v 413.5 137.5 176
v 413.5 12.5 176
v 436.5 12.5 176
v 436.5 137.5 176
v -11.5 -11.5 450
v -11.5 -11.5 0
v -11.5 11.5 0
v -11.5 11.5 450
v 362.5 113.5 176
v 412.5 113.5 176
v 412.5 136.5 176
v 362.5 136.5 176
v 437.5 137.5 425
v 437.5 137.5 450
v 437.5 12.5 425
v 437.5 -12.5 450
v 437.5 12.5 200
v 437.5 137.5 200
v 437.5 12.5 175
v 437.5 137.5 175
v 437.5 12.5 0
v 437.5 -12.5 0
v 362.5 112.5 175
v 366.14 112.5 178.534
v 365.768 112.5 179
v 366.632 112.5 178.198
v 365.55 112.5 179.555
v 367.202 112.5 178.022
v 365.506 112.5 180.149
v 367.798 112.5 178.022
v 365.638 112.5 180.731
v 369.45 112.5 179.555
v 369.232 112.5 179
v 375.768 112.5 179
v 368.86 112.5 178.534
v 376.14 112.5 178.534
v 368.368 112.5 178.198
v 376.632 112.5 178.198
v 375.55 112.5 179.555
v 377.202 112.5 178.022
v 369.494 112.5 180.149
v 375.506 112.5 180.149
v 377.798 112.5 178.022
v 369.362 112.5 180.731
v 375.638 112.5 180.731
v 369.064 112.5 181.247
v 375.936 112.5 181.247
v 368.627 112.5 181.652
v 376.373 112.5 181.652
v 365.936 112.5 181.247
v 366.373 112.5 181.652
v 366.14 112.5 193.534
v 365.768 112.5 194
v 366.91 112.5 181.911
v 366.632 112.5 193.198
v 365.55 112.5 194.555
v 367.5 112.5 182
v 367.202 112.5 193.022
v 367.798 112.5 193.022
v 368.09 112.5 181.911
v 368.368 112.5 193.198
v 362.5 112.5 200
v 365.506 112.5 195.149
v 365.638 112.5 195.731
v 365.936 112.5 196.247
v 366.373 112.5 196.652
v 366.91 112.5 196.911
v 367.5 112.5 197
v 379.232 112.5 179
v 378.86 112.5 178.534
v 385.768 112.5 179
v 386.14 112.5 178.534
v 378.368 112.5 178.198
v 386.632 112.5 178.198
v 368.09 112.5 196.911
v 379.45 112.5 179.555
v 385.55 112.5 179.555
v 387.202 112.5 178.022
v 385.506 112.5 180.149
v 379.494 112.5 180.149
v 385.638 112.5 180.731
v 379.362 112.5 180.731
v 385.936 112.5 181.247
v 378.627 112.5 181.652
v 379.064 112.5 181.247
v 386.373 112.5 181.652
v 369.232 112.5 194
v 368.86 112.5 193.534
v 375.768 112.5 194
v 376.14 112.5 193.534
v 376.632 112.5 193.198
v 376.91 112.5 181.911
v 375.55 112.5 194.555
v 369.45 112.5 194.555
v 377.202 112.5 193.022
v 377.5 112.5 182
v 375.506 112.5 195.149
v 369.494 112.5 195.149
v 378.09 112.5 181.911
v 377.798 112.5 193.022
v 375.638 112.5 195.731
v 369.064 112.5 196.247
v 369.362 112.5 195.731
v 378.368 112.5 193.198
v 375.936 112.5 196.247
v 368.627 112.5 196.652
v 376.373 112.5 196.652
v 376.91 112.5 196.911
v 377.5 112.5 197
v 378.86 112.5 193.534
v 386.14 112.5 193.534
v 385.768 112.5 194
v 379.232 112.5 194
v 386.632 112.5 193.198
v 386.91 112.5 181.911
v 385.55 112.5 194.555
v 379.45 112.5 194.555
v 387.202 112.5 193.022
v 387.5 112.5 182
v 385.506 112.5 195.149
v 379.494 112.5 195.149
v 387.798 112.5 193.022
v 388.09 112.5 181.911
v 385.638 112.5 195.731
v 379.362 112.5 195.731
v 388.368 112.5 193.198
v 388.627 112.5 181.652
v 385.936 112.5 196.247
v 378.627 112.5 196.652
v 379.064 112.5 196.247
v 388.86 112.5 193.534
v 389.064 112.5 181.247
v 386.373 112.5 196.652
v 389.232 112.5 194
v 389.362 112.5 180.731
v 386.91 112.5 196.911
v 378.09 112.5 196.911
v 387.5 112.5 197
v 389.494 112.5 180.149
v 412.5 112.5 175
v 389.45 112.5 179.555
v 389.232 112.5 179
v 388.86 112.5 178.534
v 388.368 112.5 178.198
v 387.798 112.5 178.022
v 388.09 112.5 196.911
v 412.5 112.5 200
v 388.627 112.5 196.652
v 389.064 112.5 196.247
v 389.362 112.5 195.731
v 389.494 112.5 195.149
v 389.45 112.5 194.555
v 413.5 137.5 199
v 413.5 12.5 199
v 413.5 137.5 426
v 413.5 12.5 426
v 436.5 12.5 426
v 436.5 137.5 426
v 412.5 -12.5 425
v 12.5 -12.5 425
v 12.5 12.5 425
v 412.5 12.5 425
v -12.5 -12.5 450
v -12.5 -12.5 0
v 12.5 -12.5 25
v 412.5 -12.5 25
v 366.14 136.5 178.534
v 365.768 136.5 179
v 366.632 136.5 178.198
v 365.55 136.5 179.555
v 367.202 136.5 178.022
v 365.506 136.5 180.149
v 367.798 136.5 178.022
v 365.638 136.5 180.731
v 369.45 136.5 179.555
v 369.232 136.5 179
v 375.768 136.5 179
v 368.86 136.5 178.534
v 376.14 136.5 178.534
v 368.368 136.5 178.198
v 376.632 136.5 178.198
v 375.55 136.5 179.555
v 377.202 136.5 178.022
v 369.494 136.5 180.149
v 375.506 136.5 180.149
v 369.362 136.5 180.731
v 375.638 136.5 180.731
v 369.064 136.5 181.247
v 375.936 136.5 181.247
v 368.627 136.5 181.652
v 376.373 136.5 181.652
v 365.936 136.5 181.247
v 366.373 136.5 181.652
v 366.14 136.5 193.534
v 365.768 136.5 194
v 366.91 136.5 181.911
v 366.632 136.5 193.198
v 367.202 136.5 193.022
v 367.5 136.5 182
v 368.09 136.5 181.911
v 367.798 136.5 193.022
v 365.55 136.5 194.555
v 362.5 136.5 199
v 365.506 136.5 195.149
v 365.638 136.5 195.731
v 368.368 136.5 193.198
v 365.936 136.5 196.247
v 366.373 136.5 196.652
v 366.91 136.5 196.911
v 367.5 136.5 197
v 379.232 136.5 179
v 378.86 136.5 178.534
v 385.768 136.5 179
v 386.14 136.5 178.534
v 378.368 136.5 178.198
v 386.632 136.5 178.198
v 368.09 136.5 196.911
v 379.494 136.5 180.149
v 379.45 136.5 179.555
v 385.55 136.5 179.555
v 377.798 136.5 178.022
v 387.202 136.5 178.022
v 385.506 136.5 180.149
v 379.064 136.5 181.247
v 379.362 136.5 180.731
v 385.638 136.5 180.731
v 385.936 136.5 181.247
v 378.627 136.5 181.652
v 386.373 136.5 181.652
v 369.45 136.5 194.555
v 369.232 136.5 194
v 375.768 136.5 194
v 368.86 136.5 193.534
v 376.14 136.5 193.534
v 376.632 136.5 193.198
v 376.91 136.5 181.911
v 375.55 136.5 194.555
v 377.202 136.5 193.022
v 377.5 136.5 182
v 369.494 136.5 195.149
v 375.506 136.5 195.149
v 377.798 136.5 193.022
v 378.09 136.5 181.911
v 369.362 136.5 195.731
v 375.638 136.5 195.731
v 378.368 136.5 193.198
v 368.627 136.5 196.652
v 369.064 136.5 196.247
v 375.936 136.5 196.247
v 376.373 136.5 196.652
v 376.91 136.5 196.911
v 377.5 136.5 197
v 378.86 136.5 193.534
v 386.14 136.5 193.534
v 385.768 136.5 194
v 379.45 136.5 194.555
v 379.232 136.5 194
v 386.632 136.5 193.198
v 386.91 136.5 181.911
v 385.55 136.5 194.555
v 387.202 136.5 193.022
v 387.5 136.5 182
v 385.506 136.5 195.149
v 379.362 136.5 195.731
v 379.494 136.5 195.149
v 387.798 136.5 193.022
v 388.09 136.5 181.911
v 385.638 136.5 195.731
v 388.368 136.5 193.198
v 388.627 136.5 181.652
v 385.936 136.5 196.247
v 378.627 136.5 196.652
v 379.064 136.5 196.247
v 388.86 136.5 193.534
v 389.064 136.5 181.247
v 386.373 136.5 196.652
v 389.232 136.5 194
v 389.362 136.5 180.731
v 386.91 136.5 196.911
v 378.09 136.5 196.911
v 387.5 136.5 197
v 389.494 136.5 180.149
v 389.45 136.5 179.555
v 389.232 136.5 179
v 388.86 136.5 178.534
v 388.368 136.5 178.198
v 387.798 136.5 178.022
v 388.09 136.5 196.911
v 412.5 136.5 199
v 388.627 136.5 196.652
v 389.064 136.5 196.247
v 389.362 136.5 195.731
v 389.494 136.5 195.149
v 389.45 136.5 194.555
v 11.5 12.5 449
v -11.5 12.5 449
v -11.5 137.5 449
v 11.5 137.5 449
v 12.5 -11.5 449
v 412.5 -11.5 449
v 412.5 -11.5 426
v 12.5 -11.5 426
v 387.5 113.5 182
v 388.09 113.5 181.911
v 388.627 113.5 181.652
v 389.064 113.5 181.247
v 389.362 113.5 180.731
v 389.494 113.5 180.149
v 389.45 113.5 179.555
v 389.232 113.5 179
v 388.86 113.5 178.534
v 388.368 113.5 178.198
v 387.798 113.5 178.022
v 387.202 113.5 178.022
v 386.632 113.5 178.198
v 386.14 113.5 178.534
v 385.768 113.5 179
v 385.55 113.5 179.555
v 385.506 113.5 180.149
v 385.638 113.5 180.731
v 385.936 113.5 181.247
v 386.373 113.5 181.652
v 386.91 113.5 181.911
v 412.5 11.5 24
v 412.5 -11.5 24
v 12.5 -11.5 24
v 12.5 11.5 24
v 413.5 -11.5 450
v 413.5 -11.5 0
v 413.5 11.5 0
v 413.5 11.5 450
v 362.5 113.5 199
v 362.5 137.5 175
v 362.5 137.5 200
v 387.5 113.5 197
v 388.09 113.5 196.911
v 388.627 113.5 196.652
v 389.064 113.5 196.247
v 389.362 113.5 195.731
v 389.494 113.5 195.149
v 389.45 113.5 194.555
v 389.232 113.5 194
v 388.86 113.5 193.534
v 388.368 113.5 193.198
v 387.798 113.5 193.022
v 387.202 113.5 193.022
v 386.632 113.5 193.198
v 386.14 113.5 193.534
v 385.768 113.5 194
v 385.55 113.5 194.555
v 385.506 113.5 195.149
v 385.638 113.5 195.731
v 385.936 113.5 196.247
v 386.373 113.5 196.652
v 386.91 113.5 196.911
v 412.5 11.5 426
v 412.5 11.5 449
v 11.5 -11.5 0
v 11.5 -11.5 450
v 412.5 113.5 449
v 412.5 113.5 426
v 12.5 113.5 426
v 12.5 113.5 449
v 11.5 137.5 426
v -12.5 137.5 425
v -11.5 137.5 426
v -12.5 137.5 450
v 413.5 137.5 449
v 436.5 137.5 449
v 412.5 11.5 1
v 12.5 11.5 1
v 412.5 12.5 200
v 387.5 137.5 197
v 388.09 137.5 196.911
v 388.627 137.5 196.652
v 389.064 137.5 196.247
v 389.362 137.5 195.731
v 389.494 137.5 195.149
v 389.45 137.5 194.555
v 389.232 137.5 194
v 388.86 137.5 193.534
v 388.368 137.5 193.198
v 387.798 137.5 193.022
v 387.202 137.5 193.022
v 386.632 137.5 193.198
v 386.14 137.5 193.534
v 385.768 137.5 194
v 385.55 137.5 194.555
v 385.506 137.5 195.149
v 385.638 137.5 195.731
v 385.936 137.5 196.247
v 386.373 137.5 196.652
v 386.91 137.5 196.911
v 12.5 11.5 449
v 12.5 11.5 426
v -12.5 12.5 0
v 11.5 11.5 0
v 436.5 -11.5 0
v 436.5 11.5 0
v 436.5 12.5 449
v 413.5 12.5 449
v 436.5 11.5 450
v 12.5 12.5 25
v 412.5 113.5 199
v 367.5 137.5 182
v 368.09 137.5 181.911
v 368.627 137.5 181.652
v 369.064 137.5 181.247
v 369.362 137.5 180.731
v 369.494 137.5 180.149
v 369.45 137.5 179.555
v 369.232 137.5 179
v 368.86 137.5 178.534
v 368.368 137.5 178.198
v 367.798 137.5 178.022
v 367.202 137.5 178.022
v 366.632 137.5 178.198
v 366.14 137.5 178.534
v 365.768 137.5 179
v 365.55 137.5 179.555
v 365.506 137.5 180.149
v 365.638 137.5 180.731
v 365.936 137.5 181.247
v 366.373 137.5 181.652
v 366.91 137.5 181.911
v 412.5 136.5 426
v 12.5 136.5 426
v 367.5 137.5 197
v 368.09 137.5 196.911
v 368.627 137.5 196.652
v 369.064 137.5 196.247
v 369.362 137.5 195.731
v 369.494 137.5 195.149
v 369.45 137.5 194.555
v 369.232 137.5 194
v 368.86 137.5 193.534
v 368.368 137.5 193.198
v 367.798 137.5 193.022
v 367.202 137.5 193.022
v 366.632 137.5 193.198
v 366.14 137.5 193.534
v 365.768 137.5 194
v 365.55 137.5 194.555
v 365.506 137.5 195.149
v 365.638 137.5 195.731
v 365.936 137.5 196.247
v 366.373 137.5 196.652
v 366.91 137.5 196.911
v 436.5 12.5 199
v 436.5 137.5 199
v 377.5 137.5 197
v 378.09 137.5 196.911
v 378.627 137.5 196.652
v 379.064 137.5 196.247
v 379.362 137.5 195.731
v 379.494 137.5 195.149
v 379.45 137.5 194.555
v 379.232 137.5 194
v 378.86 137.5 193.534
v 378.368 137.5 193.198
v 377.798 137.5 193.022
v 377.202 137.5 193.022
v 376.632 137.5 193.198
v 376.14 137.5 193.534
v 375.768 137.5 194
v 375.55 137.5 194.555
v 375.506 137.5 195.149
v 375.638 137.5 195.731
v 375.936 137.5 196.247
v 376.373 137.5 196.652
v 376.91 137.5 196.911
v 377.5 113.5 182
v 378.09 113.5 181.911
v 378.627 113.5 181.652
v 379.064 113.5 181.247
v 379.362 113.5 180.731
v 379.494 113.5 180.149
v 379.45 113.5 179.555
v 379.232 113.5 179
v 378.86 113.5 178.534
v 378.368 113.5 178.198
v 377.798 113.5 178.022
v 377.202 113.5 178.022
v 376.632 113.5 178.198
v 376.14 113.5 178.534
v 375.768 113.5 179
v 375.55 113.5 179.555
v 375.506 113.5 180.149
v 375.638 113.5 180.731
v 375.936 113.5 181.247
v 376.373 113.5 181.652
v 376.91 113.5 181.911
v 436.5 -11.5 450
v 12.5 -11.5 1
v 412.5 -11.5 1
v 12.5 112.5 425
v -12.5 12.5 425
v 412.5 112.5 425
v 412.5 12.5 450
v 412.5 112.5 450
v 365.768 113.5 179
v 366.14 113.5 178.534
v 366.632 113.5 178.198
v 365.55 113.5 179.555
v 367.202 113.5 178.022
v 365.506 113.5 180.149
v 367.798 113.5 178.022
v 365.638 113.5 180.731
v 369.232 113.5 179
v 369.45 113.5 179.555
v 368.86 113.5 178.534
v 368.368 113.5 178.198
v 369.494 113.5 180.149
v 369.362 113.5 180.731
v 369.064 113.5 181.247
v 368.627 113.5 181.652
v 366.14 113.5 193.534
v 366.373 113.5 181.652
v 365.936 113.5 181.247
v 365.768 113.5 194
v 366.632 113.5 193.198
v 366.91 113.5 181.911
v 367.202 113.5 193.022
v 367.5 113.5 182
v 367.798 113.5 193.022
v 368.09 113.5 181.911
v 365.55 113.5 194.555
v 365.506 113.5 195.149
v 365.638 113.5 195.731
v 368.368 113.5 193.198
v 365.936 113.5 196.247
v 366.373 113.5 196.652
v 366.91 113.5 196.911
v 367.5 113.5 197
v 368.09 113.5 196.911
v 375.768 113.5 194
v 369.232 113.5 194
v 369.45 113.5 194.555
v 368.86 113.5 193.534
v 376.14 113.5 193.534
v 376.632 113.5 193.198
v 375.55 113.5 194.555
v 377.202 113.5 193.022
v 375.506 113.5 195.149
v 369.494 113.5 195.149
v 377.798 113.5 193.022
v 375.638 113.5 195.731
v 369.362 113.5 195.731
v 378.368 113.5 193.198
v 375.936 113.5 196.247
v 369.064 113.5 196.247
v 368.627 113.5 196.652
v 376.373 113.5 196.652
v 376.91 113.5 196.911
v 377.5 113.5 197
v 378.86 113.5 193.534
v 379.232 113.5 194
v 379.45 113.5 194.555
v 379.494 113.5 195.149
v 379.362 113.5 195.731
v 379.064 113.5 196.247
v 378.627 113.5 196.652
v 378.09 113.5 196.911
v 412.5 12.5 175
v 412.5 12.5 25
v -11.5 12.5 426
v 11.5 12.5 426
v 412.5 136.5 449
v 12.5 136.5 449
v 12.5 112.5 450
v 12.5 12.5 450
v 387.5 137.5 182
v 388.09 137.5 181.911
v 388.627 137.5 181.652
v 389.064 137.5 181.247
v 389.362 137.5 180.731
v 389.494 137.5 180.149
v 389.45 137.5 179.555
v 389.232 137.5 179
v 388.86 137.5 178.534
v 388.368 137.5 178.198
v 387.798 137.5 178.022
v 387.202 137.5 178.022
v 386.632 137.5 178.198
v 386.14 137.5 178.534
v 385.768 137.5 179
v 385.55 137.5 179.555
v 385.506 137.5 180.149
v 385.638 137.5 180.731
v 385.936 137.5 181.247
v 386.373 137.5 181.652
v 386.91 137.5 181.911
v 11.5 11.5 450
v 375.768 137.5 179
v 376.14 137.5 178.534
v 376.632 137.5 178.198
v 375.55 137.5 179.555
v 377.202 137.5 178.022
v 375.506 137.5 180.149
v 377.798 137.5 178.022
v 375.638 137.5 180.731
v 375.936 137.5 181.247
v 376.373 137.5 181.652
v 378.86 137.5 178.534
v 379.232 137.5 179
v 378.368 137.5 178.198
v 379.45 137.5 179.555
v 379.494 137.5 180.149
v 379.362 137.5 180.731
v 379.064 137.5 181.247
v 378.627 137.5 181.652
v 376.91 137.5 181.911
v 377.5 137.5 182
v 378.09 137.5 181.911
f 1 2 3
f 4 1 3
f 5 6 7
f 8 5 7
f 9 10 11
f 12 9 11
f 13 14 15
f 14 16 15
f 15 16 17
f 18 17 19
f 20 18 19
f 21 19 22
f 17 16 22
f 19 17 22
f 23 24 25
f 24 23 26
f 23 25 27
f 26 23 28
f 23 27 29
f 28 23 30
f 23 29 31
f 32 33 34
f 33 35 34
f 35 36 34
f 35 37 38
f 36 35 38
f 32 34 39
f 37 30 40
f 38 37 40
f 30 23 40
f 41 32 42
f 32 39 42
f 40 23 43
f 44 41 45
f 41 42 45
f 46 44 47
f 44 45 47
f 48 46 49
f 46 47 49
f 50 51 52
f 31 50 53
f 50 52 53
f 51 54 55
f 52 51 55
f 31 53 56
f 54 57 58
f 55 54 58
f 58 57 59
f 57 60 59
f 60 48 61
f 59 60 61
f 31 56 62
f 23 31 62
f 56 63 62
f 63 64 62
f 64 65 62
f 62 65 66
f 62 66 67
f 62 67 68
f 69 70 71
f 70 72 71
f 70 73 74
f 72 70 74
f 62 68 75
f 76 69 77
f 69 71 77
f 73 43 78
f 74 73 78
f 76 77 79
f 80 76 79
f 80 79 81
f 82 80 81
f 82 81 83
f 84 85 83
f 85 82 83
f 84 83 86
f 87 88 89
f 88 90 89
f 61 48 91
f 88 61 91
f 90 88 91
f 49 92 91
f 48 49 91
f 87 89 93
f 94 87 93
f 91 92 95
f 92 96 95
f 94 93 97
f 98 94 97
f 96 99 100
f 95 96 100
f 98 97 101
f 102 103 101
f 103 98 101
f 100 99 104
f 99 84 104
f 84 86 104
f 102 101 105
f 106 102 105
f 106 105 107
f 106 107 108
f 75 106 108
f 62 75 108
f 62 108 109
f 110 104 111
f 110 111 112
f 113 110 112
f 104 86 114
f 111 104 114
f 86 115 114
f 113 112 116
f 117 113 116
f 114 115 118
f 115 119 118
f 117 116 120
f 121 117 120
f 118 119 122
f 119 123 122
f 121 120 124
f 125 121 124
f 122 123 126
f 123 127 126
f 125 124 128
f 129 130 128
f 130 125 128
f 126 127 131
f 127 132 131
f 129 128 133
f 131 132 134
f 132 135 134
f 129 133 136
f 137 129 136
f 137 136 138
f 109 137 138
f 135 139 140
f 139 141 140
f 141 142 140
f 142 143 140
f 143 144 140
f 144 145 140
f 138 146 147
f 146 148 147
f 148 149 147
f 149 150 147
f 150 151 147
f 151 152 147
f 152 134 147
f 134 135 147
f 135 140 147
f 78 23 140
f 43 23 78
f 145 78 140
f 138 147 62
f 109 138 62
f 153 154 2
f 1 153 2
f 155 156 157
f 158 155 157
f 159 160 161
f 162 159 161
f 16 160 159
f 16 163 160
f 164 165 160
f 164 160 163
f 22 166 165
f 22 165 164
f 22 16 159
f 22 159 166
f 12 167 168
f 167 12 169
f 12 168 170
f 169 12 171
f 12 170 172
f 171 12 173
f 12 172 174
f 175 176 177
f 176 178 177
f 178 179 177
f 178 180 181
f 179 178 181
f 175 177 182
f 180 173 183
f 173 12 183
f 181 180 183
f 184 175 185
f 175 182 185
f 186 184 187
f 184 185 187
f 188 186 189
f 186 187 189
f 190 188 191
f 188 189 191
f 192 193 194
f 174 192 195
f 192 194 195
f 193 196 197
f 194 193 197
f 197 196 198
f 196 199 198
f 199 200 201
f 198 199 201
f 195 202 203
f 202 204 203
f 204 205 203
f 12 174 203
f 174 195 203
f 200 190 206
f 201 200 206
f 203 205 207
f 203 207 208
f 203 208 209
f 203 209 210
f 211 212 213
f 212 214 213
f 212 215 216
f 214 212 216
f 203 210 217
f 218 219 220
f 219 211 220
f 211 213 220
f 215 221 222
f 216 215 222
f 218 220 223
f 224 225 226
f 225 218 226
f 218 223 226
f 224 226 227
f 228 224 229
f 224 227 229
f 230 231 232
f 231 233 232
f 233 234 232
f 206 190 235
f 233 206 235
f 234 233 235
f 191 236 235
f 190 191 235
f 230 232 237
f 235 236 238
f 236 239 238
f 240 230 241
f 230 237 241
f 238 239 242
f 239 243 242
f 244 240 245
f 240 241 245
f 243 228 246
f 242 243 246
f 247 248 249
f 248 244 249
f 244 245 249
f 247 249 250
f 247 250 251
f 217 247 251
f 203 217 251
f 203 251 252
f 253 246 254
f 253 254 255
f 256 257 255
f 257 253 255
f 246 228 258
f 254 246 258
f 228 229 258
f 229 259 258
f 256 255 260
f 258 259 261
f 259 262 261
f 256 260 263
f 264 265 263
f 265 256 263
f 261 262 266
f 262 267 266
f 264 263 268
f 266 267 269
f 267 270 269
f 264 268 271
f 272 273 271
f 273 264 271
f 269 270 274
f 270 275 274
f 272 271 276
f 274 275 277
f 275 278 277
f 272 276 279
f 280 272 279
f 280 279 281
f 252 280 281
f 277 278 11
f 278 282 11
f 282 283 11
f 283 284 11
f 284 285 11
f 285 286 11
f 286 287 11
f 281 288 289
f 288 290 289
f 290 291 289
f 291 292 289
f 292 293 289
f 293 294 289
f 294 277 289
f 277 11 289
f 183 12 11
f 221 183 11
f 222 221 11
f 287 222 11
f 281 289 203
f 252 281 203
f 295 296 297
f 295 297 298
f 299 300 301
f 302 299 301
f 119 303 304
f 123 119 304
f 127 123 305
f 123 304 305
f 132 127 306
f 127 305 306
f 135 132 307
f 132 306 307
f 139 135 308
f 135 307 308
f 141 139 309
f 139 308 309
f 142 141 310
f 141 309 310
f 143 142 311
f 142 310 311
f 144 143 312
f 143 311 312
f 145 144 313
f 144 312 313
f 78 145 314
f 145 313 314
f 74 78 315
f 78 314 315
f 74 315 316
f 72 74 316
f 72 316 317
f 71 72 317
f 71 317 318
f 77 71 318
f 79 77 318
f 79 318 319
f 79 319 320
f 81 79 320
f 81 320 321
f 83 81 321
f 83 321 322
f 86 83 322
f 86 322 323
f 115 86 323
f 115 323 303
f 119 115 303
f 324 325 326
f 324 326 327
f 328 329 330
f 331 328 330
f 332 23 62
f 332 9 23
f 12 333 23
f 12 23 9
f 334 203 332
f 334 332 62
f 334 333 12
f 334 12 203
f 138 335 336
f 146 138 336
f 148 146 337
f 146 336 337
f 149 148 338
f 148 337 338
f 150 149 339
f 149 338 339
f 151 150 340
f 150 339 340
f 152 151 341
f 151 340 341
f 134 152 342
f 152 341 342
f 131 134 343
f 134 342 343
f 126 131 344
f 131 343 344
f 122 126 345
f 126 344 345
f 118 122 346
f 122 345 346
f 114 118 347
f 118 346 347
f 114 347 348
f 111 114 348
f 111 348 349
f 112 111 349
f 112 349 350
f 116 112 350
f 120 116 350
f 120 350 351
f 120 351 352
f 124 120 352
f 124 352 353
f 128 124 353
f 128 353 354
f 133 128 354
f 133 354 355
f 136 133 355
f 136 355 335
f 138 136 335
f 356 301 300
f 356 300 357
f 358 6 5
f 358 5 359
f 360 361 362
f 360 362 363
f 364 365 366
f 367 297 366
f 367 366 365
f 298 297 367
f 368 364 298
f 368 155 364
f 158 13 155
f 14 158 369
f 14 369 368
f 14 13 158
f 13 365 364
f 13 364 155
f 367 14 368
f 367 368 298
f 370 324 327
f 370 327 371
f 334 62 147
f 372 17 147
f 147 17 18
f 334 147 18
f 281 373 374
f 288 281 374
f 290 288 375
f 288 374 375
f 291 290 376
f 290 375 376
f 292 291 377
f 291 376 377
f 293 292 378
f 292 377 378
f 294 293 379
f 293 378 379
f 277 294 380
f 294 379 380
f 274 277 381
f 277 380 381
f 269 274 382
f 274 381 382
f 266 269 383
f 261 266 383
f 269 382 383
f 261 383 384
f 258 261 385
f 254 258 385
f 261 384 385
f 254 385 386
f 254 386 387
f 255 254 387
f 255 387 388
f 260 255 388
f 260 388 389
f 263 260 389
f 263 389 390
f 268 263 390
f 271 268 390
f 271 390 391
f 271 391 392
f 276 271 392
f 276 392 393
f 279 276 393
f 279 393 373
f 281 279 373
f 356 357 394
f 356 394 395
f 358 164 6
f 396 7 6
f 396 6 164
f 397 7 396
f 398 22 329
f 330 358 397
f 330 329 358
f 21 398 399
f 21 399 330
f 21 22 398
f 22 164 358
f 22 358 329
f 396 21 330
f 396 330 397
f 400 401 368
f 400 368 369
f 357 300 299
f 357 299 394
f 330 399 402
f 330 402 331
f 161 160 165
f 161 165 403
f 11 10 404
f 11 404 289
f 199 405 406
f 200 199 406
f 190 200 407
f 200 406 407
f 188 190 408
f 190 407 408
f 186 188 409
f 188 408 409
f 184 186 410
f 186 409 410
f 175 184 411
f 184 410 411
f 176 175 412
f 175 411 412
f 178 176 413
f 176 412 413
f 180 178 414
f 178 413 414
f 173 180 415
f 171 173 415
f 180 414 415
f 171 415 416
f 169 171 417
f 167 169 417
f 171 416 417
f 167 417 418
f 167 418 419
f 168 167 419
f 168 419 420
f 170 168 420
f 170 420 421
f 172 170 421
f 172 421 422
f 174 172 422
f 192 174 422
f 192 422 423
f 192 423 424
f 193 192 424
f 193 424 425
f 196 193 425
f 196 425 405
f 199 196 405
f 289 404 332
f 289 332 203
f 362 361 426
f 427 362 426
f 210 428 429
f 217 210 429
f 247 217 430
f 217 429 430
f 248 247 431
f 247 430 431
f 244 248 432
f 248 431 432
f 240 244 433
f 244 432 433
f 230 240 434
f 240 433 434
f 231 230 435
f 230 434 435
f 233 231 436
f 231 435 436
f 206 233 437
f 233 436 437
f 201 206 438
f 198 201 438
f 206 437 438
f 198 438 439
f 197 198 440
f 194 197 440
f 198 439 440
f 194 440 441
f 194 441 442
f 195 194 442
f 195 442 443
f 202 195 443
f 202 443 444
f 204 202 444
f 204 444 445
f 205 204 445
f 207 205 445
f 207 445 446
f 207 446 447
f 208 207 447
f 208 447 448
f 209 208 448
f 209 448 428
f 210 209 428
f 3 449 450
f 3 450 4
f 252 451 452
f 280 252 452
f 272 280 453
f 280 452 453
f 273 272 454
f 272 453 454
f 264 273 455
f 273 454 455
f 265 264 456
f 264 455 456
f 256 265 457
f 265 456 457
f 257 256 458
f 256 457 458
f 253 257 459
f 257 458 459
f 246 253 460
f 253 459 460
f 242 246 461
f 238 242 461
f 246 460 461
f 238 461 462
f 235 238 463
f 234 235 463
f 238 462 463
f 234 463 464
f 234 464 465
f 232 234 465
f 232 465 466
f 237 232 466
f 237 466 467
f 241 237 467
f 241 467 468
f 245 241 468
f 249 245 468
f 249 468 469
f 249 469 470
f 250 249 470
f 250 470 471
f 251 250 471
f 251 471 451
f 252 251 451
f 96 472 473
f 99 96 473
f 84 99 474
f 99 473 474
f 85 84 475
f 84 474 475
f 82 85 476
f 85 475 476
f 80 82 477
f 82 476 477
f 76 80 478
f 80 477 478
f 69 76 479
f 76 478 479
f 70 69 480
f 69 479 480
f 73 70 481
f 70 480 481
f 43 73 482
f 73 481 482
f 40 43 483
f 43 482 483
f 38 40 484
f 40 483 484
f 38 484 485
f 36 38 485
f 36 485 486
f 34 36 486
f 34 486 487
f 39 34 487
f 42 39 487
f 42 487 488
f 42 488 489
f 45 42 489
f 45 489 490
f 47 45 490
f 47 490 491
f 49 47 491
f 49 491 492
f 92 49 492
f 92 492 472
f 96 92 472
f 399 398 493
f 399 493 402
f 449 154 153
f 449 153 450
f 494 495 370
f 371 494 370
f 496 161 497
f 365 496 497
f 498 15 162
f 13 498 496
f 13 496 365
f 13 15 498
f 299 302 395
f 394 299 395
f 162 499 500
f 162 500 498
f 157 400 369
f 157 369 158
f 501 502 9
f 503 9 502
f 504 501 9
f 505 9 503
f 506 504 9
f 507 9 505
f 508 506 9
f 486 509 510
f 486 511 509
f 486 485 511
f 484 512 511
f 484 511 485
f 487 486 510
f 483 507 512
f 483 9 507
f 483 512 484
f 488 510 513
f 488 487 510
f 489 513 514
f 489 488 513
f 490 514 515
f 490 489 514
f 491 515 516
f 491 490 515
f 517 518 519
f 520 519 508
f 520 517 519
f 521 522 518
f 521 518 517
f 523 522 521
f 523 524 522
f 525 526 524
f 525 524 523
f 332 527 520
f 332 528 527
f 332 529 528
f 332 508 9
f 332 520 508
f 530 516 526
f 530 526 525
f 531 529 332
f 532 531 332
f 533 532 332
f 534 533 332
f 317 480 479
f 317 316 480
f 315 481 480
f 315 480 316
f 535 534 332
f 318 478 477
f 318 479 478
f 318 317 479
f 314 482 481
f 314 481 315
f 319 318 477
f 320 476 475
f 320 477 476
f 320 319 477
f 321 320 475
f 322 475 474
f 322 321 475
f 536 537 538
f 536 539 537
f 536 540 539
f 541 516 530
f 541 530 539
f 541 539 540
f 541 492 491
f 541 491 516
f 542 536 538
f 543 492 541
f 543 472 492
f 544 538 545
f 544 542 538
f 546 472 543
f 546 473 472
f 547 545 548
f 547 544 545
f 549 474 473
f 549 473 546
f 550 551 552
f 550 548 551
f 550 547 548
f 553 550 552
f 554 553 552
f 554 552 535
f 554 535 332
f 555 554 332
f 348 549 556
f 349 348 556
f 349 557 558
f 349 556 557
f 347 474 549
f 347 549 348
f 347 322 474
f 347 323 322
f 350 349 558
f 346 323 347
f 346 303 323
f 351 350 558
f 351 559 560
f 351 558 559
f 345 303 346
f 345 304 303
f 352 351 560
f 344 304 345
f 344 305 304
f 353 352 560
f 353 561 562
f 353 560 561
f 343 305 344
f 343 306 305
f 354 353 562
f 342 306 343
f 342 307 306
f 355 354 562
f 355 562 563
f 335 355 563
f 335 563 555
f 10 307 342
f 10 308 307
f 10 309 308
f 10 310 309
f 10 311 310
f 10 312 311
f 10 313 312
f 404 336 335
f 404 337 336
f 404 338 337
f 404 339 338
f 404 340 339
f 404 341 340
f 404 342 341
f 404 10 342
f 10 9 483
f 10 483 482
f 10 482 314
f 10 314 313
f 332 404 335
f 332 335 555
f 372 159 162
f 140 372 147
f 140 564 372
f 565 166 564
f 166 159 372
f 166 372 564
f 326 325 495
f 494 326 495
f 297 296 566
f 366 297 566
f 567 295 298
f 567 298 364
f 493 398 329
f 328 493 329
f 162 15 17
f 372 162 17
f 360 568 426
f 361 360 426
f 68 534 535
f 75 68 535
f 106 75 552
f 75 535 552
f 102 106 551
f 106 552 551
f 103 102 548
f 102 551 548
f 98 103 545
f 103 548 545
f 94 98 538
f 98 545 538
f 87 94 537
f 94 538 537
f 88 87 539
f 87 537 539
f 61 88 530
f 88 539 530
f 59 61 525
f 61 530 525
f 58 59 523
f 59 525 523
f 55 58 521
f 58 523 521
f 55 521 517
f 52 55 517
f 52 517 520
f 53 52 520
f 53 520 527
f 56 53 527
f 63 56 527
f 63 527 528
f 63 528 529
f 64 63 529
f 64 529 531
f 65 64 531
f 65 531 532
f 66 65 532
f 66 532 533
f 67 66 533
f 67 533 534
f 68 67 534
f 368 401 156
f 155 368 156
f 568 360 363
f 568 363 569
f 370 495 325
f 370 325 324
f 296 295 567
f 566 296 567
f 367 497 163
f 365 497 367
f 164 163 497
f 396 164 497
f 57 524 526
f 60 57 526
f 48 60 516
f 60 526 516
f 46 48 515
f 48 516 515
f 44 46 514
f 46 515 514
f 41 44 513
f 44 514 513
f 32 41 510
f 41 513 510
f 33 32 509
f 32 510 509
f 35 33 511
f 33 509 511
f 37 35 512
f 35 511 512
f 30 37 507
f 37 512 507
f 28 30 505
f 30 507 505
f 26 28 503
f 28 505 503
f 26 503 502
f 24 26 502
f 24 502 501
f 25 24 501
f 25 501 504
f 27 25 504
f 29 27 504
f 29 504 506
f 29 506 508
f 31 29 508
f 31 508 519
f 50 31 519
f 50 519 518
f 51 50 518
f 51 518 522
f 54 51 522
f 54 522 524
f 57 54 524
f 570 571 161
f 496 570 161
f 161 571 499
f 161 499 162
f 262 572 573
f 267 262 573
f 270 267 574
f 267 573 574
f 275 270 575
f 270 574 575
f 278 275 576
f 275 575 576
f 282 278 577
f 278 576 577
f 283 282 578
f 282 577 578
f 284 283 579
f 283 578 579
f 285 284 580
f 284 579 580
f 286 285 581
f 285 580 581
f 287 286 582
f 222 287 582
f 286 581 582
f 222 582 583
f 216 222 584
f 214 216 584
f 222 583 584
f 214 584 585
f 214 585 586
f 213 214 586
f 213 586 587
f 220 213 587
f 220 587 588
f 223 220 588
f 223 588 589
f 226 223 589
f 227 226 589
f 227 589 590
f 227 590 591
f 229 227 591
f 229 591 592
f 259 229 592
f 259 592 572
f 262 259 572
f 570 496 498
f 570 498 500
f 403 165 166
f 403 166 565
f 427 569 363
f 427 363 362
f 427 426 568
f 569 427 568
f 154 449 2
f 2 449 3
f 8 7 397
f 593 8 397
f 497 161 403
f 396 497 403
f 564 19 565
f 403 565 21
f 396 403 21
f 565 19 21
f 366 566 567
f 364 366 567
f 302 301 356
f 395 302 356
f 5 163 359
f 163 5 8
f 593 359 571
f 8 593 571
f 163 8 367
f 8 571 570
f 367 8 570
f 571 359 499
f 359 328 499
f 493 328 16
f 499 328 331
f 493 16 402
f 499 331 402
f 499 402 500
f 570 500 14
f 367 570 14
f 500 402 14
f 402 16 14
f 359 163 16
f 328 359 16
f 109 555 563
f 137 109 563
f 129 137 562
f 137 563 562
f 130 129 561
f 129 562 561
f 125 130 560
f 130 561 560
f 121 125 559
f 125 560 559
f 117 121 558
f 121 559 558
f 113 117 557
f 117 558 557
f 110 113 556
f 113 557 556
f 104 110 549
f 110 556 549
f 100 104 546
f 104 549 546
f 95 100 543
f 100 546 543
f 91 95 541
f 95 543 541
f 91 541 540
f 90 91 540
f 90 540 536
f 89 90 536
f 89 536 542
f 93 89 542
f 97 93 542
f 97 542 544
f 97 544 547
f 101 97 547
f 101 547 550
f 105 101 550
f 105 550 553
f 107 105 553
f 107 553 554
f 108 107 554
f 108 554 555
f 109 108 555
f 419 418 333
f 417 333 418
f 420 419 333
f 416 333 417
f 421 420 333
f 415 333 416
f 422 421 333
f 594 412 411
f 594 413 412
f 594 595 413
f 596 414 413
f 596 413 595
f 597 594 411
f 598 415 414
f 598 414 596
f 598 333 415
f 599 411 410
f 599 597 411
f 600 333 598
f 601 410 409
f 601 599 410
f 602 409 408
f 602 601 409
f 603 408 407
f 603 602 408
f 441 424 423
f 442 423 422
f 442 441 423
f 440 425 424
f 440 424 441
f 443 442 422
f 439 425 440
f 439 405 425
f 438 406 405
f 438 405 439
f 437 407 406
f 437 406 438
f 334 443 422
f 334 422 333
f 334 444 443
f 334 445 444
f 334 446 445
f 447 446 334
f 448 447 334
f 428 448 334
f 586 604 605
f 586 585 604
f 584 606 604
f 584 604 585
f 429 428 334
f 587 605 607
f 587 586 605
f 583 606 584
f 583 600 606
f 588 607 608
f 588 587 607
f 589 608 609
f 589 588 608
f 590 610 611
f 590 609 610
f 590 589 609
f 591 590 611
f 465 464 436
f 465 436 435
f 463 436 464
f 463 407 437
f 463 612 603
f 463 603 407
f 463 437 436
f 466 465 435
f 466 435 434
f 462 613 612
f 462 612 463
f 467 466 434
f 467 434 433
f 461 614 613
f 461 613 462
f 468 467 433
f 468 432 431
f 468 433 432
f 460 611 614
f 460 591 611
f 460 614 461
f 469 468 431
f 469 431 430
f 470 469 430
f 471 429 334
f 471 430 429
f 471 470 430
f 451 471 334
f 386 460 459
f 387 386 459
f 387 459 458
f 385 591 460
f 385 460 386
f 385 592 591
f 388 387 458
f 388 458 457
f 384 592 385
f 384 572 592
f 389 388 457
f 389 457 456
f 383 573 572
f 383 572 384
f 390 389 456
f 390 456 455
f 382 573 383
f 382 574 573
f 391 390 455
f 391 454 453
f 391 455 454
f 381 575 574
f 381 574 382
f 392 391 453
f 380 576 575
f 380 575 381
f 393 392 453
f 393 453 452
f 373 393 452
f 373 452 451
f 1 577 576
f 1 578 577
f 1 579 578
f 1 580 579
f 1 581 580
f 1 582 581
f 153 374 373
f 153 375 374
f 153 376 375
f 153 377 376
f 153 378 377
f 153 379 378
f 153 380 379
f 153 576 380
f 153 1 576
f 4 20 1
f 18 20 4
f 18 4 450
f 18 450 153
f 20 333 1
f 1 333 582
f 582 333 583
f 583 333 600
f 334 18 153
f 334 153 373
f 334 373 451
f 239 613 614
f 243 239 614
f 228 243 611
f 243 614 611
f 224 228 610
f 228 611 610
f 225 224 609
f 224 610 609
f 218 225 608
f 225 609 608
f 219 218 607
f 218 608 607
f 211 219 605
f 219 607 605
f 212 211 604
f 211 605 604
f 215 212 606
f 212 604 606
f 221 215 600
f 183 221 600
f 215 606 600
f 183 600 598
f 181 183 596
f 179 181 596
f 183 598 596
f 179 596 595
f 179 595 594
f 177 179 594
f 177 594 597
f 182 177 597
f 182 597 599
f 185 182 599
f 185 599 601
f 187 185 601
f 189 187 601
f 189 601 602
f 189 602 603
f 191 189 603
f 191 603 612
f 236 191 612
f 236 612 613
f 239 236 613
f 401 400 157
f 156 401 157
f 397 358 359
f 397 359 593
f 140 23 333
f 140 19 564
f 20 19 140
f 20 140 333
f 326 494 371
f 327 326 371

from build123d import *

# Parameters (mm, degrees)
SKETCH1_W           = 25
SKETCH1_H           = 25
SKETCH1_W_2         = 23
SKETCH1_H_2         = 23
BOSS_EXTRUDE1_DEPTH = 450
SKETCH2_W           = 25
SKETCH2_H           = 25
SKETCH2_W_2         = 23
SKETCH2_H_2         = 23
BOSS_EXTRUDE2_DEPTH = 200
SKETCH3_W           = 25
SKETCH3_H           = 25
SKETCH3_W_2         = 23
SKETCH3_H_2         = 23
BOSS_EXTRUDE3_DEPTH = 200
SKETCH4_W           = 25
SKETCH4_H           = 25
SKETCH4_W_2         = 23
SKETCH4_H_2         = 23
BOSS_EXTRUDE4_DEPTH = 125
SKETCH5_W           = 25
SKETCH5_H           = 25
SKETCH5_W_2         = 23
SKETCH5_H_2         = 23
BOSS_EXTRUDE5_DEPTH = 50
SKETCH6_R           = 2
CUT_EXTRUDE1_DEPTH  = 25
SKETCH7_W           = 25
SKETCH7_H           = 25
SKETCH7_W_2         = 23
SKETCH7_H_2         = 23
BOSS_EXTRUDE6_DEPTH = 125
SKETCH8_W           = 25
SKETCH8_H           = 25
SKETCH8_W_2         = 23
SKETCH8_H_2         = 23
BOSS_EXTRUDE7_DEPTH = 400


with BuildPart() as part:
    # Sketch1 → Boss-Extrude1 (new body)
    with BuildSketch(Plane.XY):
        Rectangle(SKETCH1_W, SKETCH1_H)
        Rectangle(SKETCH1_W_2, SKETCH1_H_2, mode=Mode.SUBTRACT)
    boss_extrude1 = extrude(amount=BOSS_EXTRUDE1_DEPTH)

    # Sketch2 → Boss-Extrude2 (add)
    with BuildSketch(Plane(origin=(12.5, 0, 0), x_dir=(0, 0, -1), z_dir=(1, 0, 0))):
        with Locations((-437.5, 0)):
            Rectangle(SKETCH2_W, SKETCH2_H)
        with Locations((-437.5, 0)):
            Rectangle(SKETCH2_W_2, SKETCH2_H_2, mode=Mode.SUBTRACT)
    boss_extrude2 = extrude(amount=BOSS_EXTRUDE2_DEPTH)

    # Sketch3 → Boss-Extrude3 (add)
    with BuildSketch(Plane(origin=(12.5, 0, 0), x_dir=(0, 0, -1), z_dir=(1, 0, 0))):
        with Locations((-12.5, 0)):
            Rectangle(SKETCH3_W, SKETCH3_H)
        with Locations((-12.5, 0)):
            Rectangle(SKETCH3_W_2, SKETCH3_H_2, mode=Mode.SUBTRACT)
    boss_extrude3 = extrude(amount=BOSS_EXTRUDE3_DEPTH)

    # Mirror1: Boss-Extrude1, Boss-Extrude2, Boss-Extrude3 across plane
    add(boss_extrude1.mirror(Plane(origin=(212.5, 0, 0), x_dir=(0, 0, 1), z_dir=(1, 0, 0))))
    add(boss_extrude2.mirror(Plane(origin=(212.5, 0, 0), x_dir=(0, 0, 1), z_dir=(1, 0, 0))))
    add(boss_extrude3.mirror(Plane(origin=(212.5, 0, 0), x_dir=(0, 0, 1), z_dir=(1, 0, 0))))

    # Sketch4 → Boss-Extrude4 (add)
    with BuildSketch(Plane(origin=(0, 12.5, 0), x_dir=(1, 0, 0), z_dir=(0, 1, 0))):
        with Locations((425, -187.5)):
            Rectangle(SKETCH4_W, SKETCH4_H)
        with Locations((425, -187.5)):
            Rectangle(SKETCH4_W_2, SKETCH4_H_2, mode=Mode.SUBTRACT)
    extrude(amount=BOSS_EXTRUDE4_DEPTH)

    # Sketch5 → Boss-Extrude5 (add)
    with BuildSketch(Plane.ZY.offset(-412.5)):
        with Locations((187.5, 125)):
            Rectangle(SKETCH5_W, SKETCH5_H)
        with Locations((187.5, 125)):
            Rectangle(SKETCH5_W_2, SKETCH5_H_2, mode=Mode.SUBTRACT)
    extrude(amount=BOSS_EXTRUDE5_DEPTH)

    # Sketch6 → Cut-Extrude1 (cut)
    with BuildSketch(Plane(origin=(0, 137.5, 0), x_dir=(1, 0, 0), z_dir=(0, 1, 0))):
        with Locations(Location((367.5, -180, 0), (0, 0, 270))):
            Circle(SKETCH6_R)
        with Locations(Location((367.5, -195, 0), (0, 0, 270))):
            Circle(SKETCH6_R)
        with Locations(Location((377.5, -180, 0), (0, 0, 270))):
            Circle(SKETCH6_R)
        with Locations(Location((377.5, -195, 0), (0, 0, 270))):
            Circle(SKETCH6_R)
        with Locations(Location((387.5, -180, 0), (0, 0, 270))):
            Circle(SKETCH6_R)
        with Locations(Location((387.5, -195, 0), (0, 0, 270))):
            Circle(SKETCH6_R)
    extrude(amount=-CUT_EXTRUDE1_DEPTH, mode=Mode.SUBTRACT)

    # Sketch7 → Boss-Extrude6 (add)
    # profile 1 of 2: a face of its own
    with BuildSketch(Plane(origin=(0, 12.5, 0), x_dir=(1, 0, 0), z_dir=(0, 1, 0))):
        with Locations((425, -437.5)):
            Rectangle(SKETCH7_W, SKETCH7_H)
        with Locations((425, -437.5)):
            Rectangle(SKETCH7_W_2, SKETCH7_H_2, mode=Mode.SUBTRACT)
    # profile 2 of 2: a face of its own
    with BuildSketch(Plane(origin=(0, 12.5, 0), x_dir=(1, 0, 0), z_dir=(0, 1, 0))):
        with Locations((0, -437.5)):
            Rectangle(SKETCH7_W, SKETCH7_H)
        with Locations((0, -437.5)):
            Rectangle(SKETCH7_W_2, SKETCH7_H_2, mode=Mode.SUBTRACT)
    extrude(amount=BOSS_EXTRUDE6_DEPTH)

    # Sketch8 → Boss-Extrude7 (add)
    with BuildSketch(Plane.ZY.offset(-412.5)):
        with Locations((437.5, 125)):
            Rectangle(SKETCH8_W, SKETCH8_H)
        with Locations((437.5, 125)):
            Rectangle(SKETCH8_W_2, SKETCH8_H_2, mode=Mode.SUBTRACT)
    extrude(amount=BOSS_EXTRUDE7_DEPTH)


solid = part.part
